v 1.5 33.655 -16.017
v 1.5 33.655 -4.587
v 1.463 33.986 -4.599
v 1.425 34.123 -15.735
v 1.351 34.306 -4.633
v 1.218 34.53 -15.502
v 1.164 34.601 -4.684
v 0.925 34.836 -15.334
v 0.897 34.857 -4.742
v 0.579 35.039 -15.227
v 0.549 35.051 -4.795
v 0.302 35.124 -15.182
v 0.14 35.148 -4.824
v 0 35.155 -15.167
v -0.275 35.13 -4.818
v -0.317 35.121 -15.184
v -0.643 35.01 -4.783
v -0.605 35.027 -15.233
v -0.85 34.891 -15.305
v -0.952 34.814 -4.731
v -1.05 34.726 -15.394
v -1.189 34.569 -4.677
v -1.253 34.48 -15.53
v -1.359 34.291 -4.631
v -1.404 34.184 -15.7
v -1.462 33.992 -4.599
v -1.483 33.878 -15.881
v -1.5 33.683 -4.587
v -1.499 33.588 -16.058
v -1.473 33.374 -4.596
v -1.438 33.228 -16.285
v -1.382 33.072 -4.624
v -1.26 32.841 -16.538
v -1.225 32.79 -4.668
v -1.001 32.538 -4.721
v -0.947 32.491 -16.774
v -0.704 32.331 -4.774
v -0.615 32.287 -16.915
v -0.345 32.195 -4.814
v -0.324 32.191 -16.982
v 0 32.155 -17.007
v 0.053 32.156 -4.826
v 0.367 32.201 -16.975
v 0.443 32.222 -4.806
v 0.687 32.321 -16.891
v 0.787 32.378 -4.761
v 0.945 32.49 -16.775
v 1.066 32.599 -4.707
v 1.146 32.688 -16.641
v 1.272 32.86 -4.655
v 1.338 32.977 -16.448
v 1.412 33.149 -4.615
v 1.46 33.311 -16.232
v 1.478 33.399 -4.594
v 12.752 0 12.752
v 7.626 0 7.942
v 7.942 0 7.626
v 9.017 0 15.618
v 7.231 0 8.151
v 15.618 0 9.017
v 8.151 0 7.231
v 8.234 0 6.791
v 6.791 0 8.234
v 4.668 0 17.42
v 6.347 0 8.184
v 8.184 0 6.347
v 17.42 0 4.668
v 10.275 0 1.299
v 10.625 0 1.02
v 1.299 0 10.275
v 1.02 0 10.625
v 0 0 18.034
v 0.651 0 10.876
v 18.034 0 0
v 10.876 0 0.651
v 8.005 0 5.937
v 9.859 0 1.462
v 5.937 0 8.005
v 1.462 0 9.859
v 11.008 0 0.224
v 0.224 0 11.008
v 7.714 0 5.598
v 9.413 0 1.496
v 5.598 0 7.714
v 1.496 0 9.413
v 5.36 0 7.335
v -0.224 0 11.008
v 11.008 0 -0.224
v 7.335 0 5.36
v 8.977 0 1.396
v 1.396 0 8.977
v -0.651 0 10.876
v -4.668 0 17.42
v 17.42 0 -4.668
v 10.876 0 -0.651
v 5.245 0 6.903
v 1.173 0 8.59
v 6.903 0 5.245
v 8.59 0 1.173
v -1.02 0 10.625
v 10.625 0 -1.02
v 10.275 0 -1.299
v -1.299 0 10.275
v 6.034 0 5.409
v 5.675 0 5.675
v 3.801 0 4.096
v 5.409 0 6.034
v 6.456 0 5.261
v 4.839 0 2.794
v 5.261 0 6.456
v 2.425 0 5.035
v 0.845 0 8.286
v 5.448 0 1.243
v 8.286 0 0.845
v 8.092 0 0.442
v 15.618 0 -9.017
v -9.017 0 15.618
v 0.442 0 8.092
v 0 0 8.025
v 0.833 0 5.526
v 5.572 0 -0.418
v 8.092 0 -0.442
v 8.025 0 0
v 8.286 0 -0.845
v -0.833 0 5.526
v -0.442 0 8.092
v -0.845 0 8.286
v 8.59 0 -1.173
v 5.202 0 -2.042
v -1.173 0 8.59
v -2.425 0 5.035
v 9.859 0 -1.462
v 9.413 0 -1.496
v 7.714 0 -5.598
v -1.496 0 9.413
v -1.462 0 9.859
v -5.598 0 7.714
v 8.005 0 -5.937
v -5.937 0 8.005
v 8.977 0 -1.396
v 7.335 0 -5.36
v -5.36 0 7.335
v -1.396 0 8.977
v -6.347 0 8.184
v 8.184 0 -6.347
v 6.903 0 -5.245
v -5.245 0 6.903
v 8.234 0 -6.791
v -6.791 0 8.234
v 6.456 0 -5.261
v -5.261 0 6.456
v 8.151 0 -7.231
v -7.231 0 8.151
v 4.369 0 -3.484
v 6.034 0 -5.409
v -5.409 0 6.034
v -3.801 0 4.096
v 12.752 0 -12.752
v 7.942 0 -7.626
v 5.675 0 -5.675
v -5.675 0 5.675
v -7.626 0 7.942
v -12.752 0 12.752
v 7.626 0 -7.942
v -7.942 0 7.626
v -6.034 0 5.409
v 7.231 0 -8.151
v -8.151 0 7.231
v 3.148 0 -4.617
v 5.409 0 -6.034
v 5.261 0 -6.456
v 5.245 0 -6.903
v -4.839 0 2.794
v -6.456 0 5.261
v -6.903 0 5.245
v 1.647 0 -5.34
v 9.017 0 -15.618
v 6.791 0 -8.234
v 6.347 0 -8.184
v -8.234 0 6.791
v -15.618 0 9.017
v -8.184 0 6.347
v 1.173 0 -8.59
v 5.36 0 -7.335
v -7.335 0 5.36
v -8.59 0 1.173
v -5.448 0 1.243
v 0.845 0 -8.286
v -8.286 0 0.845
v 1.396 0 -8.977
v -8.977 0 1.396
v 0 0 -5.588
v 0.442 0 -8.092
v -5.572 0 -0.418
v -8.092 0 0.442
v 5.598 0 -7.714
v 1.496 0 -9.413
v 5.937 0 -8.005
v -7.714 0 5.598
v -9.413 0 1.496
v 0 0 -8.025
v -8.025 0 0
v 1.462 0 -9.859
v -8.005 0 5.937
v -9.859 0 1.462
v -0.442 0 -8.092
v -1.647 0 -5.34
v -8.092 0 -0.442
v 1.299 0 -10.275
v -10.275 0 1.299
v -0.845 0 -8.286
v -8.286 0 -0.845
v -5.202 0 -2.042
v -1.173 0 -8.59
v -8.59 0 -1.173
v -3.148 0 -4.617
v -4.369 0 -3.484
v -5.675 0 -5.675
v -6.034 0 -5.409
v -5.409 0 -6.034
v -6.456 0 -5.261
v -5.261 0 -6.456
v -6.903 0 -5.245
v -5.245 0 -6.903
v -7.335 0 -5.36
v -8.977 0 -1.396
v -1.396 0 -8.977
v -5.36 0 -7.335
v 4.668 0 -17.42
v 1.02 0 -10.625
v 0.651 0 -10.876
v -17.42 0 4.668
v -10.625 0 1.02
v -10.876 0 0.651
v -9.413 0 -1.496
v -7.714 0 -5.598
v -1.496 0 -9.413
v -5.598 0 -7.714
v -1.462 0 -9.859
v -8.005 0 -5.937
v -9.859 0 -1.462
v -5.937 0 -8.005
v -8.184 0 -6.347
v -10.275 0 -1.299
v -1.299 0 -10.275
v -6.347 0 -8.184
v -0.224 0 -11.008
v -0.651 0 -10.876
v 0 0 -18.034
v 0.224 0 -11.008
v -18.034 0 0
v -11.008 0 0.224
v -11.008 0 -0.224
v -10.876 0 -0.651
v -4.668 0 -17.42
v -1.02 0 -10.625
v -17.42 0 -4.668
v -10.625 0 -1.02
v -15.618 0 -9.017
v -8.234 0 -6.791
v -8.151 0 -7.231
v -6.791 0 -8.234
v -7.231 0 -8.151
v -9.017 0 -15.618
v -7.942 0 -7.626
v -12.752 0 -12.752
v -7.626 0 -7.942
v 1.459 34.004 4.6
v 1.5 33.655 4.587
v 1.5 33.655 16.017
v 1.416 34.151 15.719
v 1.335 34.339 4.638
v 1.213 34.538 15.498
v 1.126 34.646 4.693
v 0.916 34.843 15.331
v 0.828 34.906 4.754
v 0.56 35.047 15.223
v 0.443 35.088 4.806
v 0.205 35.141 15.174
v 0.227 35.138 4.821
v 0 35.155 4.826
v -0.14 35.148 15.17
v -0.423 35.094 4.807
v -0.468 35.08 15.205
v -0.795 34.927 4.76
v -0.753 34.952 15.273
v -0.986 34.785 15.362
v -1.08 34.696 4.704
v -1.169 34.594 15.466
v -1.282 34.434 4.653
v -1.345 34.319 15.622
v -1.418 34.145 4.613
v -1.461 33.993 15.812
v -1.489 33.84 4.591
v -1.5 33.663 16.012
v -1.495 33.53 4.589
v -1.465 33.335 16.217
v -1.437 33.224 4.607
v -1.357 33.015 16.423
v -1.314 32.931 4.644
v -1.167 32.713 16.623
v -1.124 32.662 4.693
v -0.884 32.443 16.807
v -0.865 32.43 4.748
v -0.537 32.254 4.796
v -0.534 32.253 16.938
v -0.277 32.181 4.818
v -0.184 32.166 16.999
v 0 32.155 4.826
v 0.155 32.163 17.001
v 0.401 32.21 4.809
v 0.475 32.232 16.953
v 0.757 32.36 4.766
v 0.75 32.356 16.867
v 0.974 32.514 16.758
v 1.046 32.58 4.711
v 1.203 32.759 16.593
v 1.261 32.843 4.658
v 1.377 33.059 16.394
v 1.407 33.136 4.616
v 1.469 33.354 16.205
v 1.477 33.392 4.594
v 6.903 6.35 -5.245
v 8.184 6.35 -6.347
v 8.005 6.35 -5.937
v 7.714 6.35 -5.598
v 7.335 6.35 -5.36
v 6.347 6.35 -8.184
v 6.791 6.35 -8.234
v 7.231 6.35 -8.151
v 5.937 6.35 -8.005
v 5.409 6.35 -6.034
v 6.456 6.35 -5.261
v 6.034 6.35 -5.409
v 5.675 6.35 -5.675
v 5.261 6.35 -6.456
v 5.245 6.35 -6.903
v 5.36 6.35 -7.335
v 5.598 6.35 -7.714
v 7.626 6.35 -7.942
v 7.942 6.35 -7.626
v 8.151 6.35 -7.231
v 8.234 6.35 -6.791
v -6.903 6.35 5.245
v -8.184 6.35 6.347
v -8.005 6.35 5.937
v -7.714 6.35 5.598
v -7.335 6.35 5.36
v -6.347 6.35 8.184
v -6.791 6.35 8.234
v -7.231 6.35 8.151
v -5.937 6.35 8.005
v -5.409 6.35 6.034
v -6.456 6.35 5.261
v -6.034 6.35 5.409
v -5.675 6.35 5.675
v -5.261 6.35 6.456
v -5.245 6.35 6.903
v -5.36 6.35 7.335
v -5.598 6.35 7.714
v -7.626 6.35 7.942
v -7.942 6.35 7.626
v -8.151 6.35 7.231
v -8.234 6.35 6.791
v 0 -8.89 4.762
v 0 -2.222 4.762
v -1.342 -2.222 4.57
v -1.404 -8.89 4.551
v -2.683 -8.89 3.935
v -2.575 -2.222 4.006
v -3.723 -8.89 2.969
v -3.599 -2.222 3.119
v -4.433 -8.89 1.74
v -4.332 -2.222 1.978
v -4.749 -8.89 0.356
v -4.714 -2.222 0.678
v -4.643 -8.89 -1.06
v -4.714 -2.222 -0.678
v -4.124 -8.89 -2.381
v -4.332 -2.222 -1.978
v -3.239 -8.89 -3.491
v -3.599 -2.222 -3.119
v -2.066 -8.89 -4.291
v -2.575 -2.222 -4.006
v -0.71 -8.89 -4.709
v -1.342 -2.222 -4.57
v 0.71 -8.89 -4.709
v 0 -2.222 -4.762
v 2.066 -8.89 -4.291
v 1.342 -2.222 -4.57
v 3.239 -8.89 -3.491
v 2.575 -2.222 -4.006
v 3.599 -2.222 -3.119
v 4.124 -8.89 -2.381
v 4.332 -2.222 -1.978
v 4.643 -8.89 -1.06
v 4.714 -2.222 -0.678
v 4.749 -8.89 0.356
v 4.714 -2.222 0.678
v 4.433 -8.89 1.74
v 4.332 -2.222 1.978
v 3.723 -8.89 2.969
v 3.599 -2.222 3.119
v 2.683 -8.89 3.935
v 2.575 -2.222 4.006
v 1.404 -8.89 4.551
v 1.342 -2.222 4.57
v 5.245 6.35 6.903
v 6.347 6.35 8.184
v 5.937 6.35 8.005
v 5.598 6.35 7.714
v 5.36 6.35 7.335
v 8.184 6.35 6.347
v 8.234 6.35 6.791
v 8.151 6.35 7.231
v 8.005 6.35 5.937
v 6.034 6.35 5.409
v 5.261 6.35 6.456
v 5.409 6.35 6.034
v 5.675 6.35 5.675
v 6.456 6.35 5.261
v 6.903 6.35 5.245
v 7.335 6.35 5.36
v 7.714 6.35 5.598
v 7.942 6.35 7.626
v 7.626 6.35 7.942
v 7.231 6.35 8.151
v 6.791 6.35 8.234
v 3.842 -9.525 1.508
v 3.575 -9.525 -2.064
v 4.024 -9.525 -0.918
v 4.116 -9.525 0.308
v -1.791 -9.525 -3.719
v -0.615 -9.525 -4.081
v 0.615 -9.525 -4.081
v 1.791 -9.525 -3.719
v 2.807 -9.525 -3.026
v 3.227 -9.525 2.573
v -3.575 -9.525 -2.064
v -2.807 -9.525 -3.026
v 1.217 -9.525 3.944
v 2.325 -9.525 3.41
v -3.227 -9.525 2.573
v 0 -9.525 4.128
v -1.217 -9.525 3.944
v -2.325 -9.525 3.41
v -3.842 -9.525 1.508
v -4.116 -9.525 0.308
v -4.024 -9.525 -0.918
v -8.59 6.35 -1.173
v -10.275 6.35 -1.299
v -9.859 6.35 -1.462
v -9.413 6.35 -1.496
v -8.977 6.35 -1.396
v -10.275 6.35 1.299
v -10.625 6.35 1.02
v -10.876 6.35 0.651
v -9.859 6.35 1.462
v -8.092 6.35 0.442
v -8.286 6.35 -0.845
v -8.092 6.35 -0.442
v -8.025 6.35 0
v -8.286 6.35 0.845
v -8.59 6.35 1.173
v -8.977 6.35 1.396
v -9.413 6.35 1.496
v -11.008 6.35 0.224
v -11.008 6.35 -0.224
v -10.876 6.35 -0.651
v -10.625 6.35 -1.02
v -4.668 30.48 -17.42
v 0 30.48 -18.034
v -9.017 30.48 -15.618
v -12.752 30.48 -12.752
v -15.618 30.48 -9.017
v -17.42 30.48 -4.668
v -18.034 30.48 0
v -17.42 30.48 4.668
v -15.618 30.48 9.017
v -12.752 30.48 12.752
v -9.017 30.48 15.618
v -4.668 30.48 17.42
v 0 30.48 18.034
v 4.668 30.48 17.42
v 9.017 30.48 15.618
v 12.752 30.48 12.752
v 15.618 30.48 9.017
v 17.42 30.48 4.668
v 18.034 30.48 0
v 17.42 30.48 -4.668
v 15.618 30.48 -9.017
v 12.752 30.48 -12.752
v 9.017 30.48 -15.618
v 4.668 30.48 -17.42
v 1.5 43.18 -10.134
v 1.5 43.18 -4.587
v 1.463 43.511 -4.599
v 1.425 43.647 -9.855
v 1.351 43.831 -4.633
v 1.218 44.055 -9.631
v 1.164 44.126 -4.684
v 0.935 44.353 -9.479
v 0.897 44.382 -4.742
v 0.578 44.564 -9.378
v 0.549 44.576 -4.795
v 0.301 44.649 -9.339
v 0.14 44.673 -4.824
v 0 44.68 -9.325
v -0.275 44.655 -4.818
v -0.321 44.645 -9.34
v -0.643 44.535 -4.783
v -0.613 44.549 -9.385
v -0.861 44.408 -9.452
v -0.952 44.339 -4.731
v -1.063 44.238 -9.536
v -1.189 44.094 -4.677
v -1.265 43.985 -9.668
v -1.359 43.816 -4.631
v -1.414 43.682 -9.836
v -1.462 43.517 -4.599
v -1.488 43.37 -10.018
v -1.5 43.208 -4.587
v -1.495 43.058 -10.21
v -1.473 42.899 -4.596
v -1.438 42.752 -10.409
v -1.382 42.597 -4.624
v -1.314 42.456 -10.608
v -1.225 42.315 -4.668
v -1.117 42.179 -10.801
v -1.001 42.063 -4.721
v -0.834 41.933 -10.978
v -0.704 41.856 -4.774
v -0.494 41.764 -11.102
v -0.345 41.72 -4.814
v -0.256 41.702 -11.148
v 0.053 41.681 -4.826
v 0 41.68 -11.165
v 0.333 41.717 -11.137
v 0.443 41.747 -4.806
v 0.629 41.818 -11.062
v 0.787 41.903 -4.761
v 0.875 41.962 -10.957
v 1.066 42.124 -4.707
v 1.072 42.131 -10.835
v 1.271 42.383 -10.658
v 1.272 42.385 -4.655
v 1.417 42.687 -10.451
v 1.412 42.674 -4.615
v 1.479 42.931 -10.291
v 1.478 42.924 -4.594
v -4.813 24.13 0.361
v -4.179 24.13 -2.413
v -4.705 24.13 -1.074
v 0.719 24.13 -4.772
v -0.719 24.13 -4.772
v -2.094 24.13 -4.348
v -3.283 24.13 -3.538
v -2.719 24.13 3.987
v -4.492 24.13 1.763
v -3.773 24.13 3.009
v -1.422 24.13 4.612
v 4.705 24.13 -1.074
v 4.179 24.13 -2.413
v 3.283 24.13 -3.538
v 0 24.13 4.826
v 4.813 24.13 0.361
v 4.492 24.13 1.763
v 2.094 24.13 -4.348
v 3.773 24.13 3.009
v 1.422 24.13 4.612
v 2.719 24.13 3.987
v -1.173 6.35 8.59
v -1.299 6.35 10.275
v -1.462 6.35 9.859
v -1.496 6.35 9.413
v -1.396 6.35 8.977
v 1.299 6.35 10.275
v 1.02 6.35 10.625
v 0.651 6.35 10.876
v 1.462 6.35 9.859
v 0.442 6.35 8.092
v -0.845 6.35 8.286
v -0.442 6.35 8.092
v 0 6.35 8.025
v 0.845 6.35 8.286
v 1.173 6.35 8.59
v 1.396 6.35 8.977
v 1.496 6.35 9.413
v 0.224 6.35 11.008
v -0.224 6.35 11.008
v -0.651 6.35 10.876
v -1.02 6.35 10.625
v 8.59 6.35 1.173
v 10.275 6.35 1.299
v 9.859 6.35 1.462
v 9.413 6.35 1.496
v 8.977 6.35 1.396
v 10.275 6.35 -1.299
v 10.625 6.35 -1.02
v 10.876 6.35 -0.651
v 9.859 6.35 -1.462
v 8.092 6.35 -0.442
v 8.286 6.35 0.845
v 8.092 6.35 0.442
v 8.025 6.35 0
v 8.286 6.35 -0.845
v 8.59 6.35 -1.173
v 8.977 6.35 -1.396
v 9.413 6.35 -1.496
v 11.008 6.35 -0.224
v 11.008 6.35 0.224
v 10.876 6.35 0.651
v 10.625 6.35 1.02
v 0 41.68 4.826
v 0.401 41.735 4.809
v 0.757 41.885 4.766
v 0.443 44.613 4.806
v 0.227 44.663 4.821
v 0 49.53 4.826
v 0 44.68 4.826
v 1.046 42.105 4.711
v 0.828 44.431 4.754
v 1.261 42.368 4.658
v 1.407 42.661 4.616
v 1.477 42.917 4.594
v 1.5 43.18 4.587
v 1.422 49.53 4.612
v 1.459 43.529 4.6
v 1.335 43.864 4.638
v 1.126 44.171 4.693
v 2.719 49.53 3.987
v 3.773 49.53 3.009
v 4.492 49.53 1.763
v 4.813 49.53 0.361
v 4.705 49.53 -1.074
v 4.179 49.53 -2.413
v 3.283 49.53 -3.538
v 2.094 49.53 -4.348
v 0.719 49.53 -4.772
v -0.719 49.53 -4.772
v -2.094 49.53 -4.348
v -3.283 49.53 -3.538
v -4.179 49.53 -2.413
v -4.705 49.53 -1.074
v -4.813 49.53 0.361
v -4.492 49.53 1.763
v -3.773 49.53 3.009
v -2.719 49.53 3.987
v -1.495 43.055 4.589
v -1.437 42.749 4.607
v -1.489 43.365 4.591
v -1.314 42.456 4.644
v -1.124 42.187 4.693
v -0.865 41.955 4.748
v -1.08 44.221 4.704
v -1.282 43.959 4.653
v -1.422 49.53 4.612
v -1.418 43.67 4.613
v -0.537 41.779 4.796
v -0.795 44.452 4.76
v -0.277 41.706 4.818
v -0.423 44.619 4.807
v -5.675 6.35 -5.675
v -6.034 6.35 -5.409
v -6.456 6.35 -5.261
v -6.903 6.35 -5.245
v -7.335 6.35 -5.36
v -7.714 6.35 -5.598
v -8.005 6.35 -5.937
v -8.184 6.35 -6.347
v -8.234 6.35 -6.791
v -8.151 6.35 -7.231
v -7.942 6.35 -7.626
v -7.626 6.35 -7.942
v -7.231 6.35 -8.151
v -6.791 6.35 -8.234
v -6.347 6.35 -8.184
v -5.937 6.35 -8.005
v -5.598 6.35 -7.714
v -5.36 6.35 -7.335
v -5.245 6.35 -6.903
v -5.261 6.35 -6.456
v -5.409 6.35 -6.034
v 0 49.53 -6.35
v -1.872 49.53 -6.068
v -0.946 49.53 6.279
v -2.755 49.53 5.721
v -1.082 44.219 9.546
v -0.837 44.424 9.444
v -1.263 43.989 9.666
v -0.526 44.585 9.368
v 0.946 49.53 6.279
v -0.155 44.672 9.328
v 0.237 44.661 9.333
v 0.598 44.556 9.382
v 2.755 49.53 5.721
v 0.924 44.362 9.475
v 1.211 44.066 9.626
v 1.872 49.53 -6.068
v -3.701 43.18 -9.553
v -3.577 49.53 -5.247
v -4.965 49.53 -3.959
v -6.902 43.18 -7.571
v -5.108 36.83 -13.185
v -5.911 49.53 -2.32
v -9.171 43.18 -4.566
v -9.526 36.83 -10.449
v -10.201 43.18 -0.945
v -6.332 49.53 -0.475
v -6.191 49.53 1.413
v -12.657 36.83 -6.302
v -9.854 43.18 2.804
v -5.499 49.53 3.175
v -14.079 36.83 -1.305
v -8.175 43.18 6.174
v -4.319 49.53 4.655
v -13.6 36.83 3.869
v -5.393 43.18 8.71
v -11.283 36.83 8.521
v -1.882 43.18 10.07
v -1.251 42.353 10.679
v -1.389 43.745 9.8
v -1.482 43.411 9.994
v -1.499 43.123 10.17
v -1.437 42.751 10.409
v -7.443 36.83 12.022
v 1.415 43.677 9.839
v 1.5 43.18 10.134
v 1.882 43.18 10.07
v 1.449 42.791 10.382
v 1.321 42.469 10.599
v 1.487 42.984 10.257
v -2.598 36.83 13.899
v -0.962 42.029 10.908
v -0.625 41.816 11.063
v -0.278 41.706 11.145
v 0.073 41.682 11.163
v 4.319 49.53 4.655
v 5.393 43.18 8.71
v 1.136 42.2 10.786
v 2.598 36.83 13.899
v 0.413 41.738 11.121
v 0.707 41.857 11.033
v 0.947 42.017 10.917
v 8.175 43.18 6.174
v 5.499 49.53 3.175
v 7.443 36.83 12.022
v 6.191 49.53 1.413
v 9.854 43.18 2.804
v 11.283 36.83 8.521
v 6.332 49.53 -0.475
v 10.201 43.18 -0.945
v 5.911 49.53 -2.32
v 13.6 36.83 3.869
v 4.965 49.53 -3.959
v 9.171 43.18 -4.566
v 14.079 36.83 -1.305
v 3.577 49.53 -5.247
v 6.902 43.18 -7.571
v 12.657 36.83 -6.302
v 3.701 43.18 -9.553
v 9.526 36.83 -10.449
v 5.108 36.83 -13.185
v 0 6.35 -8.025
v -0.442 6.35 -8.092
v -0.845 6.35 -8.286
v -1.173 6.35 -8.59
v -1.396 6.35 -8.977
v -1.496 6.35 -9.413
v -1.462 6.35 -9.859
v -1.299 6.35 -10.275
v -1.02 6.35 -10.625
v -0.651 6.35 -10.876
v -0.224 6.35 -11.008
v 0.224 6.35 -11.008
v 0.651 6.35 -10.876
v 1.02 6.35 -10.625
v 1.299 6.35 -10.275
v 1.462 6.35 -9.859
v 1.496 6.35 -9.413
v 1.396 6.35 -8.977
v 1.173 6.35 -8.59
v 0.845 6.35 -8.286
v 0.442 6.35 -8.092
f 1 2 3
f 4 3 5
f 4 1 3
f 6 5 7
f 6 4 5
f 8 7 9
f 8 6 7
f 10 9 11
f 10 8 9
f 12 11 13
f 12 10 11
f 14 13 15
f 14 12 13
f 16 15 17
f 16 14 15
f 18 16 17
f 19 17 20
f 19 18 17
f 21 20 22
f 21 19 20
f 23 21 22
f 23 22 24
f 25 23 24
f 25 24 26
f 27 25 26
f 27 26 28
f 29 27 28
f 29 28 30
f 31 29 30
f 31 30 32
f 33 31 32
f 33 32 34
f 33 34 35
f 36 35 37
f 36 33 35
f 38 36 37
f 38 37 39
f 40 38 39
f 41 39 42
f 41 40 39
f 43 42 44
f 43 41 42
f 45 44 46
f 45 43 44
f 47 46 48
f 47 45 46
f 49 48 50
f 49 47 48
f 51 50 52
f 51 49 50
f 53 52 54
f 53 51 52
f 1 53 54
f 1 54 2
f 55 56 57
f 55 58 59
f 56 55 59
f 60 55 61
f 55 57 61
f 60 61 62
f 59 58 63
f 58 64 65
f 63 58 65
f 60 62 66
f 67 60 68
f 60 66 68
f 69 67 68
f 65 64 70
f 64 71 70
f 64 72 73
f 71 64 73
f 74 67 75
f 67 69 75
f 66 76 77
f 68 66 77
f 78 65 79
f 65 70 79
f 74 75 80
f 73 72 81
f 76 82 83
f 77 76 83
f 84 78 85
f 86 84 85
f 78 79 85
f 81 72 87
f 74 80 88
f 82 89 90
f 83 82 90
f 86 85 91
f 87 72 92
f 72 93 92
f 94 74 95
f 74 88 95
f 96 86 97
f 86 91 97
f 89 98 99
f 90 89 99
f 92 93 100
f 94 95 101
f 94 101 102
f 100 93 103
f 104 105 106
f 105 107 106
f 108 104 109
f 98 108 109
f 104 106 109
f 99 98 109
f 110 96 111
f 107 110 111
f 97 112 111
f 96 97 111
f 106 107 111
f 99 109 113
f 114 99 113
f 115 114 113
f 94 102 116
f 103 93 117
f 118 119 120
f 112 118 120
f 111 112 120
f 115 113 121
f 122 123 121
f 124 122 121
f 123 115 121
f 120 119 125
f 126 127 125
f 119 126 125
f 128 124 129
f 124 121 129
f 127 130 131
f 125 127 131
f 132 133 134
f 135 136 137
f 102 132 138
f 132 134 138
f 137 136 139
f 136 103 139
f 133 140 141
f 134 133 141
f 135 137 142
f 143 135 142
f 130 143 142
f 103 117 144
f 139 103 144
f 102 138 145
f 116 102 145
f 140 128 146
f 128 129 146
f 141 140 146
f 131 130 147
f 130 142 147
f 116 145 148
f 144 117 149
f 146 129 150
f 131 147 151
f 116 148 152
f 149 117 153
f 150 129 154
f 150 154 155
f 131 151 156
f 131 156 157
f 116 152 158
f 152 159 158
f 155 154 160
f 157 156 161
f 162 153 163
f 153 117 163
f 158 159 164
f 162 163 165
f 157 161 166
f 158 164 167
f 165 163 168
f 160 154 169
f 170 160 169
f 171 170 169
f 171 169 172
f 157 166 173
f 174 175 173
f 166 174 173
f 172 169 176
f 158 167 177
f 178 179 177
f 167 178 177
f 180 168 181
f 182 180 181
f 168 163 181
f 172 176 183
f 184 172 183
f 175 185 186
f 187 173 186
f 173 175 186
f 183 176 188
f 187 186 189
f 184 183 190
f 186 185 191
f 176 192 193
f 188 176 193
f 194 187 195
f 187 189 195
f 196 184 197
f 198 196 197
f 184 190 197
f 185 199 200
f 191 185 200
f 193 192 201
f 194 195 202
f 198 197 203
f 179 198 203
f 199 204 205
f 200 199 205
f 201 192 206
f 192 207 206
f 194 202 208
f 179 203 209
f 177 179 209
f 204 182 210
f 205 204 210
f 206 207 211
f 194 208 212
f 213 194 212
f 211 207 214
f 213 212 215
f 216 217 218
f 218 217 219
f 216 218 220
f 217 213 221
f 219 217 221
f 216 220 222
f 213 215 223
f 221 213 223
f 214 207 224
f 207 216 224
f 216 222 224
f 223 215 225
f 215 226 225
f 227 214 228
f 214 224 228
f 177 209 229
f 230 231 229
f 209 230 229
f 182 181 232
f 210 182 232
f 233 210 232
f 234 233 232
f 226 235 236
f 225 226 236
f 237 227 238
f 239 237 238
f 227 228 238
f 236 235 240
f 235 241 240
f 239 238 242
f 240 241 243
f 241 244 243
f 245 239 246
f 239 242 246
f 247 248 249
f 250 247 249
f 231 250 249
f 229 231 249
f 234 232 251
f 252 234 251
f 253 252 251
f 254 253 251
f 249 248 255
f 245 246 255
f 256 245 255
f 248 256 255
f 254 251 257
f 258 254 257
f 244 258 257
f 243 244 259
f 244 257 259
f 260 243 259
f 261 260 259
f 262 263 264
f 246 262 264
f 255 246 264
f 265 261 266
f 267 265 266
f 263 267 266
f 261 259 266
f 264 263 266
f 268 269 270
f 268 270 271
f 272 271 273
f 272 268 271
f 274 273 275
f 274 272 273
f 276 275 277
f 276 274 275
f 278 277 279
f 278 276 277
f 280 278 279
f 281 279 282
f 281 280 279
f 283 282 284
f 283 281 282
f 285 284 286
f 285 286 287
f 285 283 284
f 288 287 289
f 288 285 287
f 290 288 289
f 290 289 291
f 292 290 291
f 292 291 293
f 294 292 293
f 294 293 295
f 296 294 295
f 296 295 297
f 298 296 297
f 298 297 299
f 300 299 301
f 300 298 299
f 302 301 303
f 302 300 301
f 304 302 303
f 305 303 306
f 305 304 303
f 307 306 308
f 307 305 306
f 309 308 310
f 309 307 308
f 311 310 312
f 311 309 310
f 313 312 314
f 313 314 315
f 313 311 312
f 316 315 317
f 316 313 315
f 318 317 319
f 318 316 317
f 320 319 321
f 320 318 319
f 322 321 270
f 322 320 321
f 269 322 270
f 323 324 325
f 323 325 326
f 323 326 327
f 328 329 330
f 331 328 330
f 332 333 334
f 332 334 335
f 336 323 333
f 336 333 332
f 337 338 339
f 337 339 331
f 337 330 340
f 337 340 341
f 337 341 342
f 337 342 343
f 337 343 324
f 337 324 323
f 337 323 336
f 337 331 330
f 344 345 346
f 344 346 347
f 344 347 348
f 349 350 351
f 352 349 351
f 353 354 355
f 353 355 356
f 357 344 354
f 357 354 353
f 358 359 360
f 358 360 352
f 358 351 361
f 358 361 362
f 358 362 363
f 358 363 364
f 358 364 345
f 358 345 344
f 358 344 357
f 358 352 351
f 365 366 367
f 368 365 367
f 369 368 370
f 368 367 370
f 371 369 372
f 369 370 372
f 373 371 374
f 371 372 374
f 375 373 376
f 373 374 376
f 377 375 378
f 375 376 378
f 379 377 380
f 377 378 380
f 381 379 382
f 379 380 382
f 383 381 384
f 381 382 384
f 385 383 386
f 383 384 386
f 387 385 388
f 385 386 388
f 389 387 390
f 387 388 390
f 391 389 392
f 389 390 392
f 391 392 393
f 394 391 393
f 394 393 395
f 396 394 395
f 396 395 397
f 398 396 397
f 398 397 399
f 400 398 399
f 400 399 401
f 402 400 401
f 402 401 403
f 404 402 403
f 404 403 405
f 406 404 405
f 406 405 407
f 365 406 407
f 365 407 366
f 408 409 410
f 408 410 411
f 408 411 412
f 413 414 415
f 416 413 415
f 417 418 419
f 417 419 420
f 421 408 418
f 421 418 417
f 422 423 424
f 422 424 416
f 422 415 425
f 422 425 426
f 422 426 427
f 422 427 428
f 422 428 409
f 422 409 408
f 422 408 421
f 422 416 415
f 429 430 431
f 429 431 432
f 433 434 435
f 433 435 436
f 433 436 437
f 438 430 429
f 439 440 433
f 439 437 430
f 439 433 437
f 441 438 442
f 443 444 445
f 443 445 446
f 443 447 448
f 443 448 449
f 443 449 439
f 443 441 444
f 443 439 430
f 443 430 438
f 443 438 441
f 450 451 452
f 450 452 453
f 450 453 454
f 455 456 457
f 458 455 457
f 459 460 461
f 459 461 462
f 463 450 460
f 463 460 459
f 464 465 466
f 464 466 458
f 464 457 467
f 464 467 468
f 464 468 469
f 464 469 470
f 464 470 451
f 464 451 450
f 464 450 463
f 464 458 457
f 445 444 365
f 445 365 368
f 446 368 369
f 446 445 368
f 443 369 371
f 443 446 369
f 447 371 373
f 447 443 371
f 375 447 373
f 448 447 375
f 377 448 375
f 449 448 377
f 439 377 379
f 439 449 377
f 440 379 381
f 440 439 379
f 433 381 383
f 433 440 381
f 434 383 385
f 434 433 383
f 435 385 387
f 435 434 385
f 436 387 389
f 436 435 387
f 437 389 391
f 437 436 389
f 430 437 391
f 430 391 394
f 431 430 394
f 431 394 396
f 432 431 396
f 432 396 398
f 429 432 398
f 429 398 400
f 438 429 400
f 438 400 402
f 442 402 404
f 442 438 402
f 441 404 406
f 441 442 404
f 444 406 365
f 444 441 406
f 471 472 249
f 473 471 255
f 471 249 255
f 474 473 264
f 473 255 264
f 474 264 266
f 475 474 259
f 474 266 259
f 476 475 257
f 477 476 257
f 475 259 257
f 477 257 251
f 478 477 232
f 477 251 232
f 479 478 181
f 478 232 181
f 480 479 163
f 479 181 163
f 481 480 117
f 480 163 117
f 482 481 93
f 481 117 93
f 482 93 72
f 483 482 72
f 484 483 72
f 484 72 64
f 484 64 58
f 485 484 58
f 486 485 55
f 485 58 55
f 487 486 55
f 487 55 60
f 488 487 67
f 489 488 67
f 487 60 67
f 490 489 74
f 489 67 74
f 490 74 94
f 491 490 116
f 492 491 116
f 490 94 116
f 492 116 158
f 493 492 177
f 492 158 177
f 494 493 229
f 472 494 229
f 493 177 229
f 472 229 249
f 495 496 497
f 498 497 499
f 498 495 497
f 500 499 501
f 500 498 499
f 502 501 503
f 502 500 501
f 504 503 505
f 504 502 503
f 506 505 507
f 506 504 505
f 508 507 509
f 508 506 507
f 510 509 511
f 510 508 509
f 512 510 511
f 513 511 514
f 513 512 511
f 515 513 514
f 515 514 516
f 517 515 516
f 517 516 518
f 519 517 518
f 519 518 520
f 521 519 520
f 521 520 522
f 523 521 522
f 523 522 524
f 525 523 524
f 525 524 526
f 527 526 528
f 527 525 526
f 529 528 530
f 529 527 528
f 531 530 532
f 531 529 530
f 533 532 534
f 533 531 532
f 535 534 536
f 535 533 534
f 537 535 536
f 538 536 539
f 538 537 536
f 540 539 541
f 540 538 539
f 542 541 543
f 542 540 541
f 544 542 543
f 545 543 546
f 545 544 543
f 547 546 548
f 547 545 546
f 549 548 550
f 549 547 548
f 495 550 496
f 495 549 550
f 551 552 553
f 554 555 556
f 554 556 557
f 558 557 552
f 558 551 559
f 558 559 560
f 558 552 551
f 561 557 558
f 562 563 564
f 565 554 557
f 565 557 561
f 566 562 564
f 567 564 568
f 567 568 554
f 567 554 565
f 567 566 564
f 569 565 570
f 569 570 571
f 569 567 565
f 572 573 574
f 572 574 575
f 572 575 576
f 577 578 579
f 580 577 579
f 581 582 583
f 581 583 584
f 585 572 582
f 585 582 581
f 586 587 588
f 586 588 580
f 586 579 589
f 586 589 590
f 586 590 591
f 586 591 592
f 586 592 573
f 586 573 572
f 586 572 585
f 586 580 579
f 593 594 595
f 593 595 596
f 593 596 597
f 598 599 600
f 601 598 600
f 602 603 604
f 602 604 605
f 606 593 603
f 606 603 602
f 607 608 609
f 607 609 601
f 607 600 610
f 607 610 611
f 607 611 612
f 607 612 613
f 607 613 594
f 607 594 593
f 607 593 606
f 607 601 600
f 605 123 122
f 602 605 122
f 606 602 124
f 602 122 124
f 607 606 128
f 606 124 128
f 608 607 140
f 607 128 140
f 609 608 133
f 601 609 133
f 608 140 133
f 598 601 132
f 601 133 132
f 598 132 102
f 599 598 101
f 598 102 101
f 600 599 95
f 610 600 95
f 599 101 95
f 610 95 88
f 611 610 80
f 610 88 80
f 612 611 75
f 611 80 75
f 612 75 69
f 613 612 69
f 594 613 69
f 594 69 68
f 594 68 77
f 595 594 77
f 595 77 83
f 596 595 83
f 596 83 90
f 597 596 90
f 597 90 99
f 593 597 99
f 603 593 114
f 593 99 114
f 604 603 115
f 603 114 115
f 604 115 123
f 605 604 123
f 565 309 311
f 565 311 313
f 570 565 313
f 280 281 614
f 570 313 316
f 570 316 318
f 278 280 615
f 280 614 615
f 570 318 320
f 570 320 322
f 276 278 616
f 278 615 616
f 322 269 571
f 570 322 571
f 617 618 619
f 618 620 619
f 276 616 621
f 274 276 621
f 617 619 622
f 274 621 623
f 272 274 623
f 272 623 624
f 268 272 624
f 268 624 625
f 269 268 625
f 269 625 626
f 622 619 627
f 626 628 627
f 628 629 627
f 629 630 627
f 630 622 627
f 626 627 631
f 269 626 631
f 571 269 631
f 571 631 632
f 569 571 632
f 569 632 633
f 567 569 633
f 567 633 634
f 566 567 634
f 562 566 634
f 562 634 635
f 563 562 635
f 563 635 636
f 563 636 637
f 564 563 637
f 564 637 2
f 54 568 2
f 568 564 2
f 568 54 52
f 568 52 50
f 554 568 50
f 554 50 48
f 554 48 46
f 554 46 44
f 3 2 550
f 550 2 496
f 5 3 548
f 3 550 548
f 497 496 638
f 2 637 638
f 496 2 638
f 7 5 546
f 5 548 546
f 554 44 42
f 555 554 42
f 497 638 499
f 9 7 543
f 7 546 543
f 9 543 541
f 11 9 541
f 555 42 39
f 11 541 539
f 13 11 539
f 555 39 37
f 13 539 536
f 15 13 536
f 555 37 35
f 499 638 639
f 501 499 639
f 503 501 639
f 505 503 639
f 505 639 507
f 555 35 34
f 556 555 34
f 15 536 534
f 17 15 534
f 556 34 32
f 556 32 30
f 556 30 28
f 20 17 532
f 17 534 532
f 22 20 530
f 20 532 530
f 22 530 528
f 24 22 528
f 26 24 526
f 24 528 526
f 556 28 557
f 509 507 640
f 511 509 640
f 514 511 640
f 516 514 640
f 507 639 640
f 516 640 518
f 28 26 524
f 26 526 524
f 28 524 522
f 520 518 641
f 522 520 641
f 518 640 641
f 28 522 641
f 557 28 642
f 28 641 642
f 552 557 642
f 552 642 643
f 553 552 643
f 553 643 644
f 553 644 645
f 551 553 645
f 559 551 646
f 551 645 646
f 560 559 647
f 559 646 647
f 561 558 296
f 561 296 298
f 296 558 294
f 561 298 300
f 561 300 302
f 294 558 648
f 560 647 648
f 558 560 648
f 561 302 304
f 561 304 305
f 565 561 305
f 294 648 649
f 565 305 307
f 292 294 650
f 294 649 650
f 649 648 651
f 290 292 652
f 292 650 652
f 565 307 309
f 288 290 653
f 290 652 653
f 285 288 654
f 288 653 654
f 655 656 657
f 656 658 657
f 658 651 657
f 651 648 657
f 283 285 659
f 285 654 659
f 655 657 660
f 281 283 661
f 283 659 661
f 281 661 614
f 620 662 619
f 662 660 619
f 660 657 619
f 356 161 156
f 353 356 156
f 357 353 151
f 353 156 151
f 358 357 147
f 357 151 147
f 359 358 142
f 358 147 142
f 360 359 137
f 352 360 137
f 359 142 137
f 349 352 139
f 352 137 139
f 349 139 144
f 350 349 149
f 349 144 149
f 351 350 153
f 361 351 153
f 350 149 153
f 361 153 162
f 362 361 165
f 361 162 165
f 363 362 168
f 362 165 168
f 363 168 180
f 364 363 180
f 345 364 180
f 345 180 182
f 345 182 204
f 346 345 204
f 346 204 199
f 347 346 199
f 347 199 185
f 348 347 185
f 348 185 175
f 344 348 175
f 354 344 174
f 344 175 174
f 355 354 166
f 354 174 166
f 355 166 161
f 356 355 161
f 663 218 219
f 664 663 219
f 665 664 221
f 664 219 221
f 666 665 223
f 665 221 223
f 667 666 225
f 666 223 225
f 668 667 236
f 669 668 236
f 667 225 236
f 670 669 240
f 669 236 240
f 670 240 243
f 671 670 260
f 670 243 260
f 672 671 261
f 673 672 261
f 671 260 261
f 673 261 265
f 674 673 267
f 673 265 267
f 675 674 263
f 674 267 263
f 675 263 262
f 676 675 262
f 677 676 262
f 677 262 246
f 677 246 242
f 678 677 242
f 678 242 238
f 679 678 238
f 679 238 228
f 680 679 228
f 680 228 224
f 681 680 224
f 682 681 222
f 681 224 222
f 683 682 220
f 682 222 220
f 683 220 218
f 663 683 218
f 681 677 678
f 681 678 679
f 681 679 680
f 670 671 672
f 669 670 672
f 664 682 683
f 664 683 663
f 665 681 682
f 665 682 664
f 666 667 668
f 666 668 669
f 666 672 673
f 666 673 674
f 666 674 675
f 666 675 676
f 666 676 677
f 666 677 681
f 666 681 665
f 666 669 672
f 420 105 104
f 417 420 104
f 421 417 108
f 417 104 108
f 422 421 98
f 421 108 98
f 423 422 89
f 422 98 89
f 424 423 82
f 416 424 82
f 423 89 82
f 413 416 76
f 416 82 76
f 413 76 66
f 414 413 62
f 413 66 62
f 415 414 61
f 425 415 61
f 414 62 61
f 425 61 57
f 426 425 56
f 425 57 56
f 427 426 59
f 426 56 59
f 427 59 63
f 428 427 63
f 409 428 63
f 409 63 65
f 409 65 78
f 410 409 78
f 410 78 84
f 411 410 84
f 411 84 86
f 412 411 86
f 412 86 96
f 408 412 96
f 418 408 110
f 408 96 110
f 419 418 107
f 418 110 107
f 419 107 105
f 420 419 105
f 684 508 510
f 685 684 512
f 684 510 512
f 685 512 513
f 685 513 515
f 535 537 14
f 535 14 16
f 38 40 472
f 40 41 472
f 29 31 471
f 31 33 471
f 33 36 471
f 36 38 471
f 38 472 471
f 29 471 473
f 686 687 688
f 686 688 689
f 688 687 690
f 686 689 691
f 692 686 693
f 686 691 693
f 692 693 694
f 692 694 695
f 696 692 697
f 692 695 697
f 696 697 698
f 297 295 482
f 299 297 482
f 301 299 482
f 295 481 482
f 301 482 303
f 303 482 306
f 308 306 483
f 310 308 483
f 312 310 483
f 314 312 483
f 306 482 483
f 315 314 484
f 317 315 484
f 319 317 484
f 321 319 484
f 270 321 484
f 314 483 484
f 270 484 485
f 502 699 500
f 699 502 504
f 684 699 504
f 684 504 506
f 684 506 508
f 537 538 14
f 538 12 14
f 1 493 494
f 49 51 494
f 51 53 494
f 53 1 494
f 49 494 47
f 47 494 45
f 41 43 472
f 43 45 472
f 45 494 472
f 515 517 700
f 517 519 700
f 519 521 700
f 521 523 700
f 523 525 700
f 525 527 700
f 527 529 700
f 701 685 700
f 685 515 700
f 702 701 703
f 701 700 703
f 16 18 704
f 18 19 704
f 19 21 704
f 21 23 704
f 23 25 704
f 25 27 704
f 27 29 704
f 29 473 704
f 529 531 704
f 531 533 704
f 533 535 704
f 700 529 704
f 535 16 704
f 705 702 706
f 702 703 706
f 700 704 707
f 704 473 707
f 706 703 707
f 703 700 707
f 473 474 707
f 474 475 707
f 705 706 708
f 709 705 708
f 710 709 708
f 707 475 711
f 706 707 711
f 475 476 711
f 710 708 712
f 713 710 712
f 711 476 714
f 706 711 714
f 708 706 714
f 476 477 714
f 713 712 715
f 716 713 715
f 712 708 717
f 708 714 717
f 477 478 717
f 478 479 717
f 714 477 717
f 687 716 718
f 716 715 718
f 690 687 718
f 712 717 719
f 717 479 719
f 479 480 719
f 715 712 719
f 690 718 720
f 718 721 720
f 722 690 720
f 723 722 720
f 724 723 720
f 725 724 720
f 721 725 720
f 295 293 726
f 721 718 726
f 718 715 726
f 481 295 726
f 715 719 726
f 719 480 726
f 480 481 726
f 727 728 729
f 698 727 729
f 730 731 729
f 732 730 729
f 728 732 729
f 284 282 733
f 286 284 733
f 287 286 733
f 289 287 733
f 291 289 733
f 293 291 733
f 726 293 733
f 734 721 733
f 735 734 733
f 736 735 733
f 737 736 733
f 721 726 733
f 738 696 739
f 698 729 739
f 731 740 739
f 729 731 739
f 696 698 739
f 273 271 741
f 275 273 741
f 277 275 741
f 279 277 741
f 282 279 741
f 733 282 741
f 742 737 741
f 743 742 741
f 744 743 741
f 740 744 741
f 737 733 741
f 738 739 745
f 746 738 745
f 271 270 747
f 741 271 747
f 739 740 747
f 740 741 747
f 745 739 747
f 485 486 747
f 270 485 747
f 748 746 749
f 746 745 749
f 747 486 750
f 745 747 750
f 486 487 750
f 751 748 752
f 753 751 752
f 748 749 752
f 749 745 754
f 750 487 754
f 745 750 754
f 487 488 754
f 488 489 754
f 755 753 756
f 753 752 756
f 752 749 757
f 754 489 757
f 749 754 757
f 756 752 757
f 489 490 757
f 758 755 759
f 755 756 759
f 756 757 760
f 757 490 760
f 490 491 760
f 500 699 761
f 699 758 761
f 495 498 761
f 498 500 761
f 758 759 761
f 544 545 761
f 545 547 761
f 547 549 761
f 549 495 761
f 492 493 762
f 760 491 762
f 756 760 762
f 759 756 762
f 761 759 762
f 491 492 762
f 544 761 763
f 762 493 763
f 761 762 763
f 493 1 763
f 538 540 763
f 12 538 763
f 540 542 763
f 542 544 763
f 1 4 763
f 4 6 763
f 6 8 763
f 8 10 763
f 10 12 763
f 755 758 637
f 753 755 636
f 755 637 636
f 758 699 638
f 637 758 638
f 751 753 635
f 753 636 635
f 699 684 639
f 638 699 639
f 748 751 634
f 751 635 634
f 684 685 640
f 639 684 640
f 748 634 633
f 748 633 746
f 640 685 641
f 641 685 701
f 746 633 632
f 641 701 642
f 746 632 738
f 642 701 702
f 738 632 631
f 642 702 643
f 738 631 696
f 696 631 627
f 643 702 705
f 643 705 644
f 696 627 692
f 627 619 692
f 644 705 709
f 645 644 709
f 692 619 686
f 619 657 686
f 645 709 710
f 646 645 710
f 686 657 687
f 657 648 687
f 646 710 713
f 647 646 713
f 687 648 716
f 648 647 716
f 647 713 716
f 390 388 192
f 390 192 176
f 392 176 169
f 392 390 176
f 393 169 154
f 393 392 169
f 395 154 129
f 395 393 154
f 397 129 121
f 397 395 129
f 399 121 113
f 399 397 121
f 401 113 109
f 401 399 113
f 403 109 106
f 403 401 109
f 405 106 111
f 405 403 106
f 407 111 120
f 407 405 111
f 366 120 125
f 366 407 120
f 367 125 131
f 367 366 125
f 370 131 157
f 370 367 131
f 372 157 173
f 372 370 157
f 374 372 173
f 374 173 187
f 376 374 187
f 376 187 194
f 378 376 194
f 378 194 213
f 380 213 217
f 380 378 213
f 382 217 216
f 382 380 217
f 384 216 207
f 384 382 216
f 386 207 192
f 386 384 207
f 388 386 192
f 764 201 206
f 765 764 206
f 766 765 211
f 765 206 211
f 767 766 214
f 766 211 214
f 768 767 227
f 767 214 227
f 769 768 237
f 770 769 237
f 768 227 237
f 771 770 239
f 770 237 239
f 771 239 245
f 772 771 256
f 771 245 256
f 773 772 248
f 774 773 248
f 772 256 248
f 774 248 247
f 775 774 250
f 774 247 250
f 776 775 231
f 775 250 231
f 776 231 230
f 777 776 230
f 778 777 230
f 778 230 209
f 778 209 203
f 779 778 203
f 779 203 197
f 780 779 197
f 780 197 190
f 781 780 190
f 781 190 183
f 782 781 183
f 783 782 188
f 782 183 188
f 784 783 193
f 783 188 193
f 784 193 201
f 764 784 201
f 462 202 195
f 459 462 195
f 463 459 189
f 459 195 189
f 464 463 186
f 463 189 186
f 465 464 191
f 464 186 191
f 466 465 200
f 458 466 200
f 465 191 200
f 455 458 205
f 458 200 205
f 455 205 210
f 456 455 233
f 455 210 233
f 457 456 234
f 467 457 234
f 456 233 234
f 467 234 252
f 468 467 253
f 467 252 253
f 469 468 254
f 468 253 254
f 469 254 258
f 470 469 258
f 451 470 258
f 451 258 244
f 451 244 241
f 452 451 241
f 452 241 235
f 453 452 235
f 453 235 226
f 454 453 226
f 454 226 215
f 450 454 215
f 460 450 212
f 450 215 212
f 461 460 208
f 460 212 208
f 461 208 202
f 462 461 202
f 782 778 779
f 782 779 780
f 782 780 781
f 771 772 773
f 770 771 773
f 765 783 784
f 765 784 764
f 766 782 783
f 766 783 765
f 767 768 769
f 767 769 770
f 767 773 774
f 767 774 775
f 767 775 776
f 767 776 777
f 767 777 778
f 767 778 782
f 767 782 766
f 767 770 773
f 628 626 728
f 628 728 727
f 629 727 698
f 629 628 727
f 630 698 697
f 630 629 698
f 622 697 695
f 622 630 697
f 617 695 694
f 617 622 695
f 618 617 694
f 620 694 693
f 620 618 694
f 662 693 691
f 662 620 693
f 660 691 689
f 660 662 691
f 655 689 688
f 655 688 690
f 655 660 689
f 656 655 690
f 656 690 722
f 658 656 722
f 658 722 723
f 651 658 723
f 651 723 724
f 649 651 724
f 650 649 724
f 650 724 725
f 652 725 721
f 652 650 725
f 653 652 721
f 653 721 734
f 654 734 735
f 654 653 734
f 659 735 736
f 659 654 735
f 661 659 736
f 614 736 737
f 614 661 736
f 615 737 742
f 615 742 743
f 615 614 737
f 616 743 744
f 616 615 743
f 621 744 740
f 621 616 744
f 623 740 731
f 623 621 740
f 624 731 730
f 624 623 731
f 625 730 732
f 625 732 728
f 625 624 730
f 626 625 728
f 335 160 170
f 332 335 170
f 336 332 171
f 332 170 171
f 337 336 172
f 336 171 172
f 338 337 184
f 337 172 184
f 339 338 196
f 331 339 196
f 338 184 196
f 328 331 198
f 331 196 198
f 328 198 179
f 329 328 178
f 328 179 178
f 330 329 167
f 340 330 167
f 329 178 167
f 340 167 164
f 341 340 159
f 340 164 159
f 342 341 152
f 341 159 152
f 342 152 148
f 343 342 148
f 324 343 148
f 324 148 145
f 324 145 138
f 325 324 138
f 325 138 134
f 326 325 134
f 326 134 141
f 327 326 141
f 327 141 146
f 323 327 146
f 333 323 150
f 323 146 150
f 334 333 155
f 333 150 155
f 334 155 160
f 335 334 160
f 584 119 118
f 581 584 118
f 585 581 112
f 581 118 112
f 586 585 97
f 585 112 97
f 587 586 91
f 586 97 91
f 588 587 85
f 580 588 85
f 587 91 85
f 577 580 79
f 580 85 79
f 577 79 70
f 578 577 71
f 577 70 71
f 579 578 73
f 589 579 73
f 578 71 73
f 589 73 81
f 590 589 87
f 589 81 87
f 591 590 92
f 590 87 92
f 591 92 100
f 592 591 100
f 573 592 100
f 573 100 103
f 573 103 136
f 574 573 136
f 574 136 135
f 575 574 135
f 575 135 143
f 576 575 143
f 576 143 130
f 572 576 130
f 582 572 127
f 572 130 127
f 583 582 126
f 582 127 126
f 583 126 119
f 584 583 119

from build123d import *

# Parameters (mm, degrees)
SKETCH3_R               = 4.826
CUT_EXTRUDE1_DEPTH      = 25.4
CUT_EXTRUDE2_DEPTH      = 56.71060233
CUT_EXTRUDE2_DEPTH_BACK = 56.71060233
SKETCH4_R               = 1.5
SKETCH5_R               = 1.5
CUT_EXTRUDE3_DEPTH      = 6.35
CIRPATTERN1_COUNT       = 8
SKETCH6_R               = 4.7625
BOSS_EXTRUDE1_DEPTH     = 9.525
CHAMFER1_SIZE           = 0.635


with BuildPart() as part:
    # 草图1 → 旋转1 (revolve)
    with BuildSketch(Plane.XY, mode=Mode.PRIVATE) as revolve_1_sk:
        Polygon((0, 0), (0, 30.48), (0, 49.53), (6.35, 49.53), (18.034, 30.48), (18.034, 0), align=None)
    revolve(revolve_1_sk.sketch.rotate(Axis((0, 0, 0), (0, 1, 0)), 90), axis=Axis((0, 0, 0), (0, 1, 0)))

    # Sketch3 → Cut-Extrude1 (cut)
    with BuildSketch(Plane(origin=(0, 49.53, 0), x_dir=(1, 0, 0), z_dir=(0, 1, 0))):
        with Locations(Location((0, 0, 0), (0, 0, 270))):
            Circle(SKETCH3_R)
    extrude(amount=-CUT_EXTRUDE1_DEPTH, mode=Mode.SUBTRACT)

    # Sketch4 → Cut-Extrude2 (cut, two sides: drawn at the far end of the back side and taken through both)
    with BuildSketch(Plane.XY.offset(-CUT_EXTRUDE2_DEPTH_BACK)):
        with Locations((0, 43.18)):
            Circle(SKETCH4_R)
        with Locations((0, 33.655)):
            Circle(SKETCH4_R)
    extrude(amount=CUT_EXTRUDE2_DEPTH + CUT_EXTRUDE2_DEPTH_BACK, mode=Mode.SUBTRACT)

    # Sketch5 → Cut-Extrude3 (cut)
    with BuildSketch(Plane.XZ):
        with Locations(Location((0, 9.525, 0), (0, 0, 270))):
            Circle(SKETCH5_R)
    cut_extrude3 = extrude(amount=-CUT_EXTRUDE3_DEPTH, mode=Mode.SUBTRACT)

    # CirPattern1: Cut-Extrude3 ×8 about axis
    cirpattern1_axis = Axis((0, 0, 0), (0, 1, 0))
    for i in range(1, CIRPATTERN1_COUNT):
        add(cut_extrude3.rotate(cirpattern1_axis, i * 360 / CIRPATTERN1_COUNT), mode=Mode.SUBTRACT)

    # Sketch6 → Boss-Extrude1 (add)
    with BuildSketch(Plane.XZ):
        with Locations(Location((0, 0, 0), (0, 0, 90))):
            Circle(SKETCH6_R)
    extrude(amount=BOSS_EXTRUDE1_DEPTH)

    # Chamfer1
    chamfer1_edges = [part.edges().sort_by_distance(p)[0] for p in [
        (0, -9.525, -4.7625),
    ]]
    chamfer(chamfer1_edges, length=CHAMFER1_SIZE)

    # Sketch7 → Revolve1 (revolve)
    with BuildSketch(Plane.XY, mode=Mode.PRIVATE) as revolve1_sk:
        Polygon((-5.588, 0), (-4.7625, -2.2225), (-4.7625, 0), align=None)
    revolve(revolve1_sk.sketch.rotate(Axis((0, 0, 0), (0, -1, 0)), 90), axis=Axis((0, 0, 0), (0, -1, 0)))


solid = part.part
